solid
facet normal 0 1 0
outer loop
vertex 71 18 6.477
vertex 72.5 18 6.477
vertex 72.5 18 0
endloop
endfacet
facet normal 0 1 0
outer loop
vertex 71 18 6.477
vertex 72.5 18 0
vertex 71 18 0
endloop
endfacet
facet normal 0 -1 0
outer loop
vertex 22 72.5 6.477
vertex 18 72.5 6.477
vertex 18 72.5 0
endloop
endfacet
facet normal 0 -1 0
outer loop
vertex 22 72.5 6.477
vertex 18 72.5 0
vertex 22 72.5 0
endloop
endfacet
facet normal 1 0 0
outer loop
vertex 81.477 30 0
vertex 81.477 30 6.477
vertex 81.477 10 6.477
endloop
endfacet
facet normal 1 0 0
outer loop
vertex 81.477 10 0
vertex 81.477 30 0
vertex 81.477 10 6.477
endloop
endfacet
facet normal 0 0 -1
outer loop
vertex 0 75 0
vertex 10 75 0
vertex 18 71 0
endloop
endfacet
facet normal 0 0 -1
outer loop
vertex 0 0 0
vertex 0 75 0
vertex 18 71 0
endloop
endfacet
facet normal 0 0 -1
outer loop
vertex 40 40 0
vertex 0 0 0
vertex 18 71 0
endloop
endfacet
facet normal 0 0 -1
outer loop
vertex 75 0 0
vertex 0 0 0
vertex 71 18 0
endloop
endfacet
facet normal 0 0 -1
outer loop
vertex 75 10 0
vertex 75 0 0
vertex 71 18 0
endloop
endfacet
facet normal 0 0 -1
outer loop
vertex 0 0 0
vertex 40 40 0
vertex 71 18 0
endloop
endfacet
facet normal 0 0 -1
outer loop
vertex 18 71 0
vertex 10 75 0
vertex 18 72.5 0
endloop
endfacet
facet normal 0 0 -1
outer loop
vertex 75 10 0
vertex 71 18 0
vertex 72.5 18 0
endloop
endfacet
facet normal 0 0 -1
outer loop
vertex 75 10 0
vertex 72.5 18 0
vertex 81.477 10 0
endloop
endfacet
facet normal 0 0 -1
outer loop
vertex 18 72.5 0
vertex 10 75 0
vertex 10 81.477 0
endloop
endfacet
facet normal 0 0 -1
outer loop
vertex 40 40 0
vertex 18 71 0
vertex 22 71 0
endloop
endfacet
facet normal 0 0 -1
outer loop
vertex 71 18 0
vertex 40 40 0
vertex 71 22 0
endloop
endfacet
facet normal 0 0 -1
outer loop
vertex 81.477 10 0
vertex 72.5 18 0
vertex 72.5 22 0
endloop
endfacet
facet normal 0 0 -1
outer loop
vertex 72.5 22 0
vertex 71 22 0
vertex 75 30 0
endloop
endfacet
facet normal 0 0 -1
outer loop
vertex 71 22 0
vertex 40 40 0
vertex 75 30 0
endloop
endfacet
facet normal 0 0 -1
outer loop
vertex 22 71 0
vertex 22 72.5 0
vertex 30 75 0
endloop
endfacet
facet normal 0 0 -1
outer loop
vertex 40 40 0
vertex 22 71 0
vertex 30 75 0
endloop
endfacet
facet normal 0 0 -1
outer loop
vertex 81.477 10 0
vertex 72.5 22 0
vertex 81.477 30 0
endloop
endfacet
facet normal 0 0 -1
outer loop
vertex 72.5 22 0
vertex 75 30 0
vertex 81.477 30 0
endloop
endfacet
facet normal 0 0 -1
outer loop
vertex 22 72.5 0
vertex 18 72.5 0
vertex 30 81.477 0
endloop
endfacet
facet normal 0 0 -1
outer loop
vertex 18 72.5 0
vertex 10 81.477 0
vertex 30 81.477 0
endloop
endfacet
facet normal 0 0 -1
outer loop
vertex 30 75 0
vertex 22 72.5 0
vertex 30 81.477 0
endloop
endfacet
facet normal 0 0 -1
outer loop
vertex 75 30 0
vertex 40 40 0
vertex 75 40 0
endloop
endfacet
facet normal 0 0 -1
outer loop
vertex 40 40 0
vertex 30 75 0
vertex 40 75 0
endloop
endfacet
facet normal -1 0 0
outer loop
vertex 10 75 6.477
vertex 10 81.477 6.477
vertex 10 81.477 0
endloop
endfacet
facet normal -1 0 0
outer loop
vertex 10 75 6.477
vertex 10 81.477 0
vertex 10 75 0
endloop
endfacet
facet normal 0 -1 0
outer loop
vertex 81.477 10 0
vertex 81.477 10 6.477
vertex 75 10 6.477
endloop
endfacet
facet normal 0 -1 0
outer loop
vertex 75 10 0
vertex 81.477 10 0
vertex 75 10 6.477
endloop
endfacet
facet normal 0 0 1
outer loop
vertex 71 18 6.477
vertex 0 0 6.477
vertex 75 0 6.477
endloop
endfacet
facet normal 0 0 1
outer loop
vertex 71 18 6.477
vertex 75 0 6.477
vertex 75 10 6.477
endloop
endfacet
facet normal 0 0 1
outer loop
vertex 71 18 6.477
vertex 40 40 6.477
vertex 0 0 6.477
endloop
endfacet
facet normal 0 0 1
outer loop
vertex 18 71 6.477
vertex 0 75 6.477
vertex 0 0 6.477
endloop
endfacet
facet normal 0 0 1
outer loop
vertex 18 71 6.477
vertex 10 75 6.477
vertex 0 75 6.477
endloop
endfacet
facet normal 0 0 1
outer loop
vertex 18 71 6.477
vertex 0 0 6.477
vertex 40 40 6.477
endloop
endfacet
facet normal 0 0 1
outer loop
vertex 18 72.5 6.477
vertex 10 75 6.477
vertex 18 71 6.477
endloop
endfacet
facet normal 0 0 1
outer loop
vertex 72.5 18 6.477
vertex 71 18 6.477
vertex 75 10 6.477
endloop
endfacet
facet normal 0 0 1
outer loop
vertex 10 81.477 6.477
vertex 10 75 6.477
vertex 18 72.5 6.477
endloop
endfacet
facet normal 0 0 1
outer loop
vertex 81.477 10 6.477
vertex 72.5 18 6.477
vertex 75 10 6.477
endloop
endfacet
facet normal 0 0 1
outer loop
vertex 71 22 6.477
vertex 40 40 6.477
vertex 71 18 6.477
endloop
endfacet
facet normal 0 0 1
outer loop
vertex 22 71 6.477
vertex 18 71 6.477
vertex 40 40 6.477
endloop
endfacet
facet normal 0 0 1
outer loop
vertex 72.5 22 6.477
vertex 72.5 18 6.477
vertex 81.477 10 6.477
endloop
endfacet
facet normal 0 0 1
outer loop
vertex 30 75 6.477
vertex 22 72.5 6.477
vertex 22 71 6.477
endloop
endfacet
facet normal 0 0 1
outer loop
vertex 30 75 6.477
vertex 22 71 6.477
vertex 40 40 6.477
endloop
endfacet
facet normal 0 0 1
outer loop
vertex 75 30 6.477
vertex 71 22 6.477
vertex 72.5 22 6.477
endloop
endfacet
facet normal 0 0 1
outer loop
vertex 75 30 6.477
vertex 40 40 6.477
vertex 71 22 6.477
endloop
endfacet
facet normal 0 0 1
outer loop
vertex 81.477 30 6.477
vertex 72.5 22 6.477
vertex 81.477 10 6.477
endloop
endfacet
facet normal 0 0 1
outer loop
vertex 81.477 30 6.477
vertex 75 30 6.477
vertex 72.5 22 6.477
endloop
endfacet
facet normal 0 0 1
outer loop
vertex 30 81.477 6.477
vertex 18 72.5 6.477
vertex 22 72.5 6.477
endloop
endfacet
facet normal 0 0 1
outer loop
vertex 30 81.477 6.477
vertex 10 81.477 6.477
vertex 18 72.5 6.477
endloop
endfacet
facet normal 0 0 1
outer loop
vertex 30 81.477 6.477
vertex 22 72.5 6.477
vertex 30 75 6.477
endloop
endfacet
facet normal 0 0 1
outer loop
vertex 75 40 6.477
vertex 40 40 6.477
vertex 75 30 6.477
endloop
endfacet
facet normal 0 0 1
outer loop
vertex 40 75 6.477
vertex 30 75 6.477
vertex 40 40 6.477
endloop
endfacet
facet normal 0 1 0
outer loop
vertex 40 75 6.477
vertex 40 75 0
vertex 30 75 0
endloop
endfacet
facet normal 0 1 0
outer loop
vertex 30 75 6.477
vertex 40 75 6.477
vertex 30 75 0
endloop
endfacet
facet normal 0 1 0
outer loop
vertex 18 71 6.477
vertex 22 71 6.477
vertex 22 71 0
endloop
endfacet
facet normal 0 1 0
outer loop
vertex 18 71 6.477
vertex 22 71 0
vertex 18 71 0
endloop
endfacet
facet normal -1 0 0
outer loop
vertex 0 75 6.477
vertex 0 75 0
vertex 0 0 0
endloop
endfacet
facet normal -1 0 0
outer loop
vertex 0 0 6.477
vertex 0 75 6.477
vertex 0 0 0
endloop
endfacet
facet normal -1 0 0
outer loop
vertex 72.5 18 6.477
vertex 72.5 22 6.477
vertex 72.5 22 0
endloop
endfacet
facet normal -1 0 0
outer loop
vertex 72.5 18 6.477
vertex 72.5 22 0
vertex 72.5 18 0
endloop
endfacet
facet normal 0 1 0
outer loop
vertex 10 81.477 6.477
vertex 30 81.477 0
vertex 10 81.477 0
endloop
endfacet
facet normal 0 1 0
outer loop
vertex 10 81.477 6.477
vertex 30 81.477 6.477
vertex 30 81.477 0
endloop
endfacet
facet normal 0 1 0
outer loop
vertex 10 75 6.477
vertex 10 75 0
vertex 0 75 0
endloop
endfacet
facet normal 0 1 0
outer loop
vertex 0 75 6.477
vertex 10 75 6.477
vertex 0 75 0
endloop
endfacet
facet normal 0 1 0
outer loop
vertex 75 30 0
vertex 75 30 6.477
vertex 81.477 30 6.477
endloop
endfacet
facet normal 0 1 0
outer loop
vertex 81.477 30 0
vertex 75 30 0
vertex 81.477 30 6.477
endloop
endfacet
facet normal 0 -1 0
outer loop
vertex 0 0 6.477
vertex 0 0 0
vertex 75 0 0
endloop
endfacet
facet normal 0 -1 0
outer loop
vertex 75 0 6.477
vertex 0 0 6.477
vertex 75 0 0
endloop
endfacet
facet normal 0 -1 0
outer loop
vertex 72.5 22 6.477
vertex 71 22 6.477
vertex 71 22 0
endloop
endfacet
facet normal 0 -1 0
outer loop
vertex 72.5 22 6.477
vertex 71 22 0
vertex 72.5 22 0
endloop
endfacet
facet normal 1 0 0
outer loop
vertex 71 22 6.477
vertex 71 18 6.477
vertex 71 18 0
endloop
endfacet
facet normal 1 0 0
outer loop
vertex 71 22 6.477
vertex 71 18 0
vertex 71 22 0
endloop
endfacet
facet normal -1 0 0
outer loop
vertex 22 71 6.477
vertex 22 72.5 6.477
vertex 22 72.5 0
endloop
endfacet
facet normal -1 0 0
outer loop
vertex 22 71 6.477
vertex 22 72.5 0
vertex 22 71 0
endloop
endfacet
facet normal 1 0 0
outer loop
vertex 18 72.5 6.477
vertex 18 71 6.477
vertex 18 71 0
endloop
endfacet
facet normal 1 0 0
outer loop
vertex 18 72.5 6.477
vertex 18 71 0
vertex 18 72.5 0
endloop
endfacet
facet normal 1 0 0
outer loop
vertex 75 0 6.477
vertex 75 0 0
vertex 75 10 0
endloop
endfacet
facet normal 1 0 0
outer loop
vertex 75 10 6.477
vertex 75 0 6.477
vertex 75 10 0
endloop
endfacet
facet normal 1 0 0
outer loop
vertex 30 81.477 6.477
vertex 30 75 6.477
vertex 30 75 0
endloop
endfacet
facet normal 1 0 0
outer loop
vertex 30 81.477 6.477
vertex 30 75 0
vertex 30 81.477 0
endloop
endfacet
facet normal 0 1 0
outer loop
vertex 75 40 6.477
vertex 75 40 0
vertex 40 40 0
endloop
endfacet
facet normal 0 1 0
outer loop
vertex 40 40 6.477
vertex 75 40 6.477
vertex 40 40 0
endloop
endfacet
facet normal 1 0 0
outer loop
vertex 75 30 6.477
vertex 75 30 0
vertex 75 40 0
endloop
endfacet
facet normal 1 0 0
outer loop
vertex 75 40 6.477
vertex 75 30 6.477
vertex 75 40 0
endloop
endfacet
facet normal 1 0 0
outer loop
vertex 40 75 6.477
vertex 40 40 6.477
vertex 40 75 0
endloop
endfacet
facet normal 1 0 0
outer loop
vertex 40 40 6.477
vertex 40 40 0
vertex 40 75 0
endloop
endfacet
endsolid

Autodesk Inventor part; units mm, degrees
ref_plane "YZ Plane" through (0, 0, 0) normal (1, 0, 0) x (0, 1, 0)
ref_plane "XZ Plane" through (0, 0, 0) normal (0, 1, 0) x (-1, 0, 0)
ref_plane "XY Plane" through (0, 0, 0) normal (0, 0, 1) x (1, 0, 0)
sketch "Sketch1" plane through (0, 0, 0) normal (0, 0, 1) x (1, 0, 0)
  line L0 (0, 75) -> (0, 0)
  line L1 (0, 0) -> (75, 0)
  line L2 (75, 0) -> (75, 40)
  line L3 (75, 40) -> (40, 40)
  line L4 (40, 40) -> (40, 75)
  line L5 (40, 75) -> (0, 75)
  dimension "d0" = 75
  dimension "d2" = 40
extrude "Extrusion1" add sketch "Sketch1" along normal blind 6.477
sketch "Sketch2" plane through (0, 0, 6.477) normal (0, 0, 1) x (1, 0, 0)
  line L0 (75, 0) -> (75, 40) projected
  line L1 (40, 75) -> (0, 75) projected
  line L2 (10, 75) -> (30, 75)
  line L3 (30, 75) -> (30, 81.477)
  line L4 (30, 81.477) -> (10, 81.477)
  line L5 (10, 81.477) -> (10, 75)
  line L6 (75, 30) -> (81.477, 30)
  line L7 (81.477, 30) -> (81.477, 10)
  line L8 (81.477, 10) -> (75, 10)
  line L9 (75, 10) -> (75, 30)
  point P0 (75, 20)
  point P1 (20, 75)
  dimension "d5" = 6.477
  dimension "d7" = 20
extrude "Extrusion2" add sketch "Sketch2" against normal up to surface (6.477 mm away)
sketch "Sketch3" plane through (0, 0, 6.477) normal (0, 0, 1) x (1, 0, 0)
  line L0 (81.477, 10) -> (81.477, 30) projected
  line L1 (75, 30) -> (75, 40) projected
  line L2 (40, 75) -> (30, 75) projected
  line L3 (30, 81.477) -> (10, 81.477) projected
  line L4 (18, 72.5) -> (22, 72.5)
  line L5 (22, 72.5) -> (22, 71)
  line L6 (22, 71) -> (18, 71)
  line L7 (18, 71) -> (18, 72.5)
  line L8 (72.5, 18) -> (71, 18)
  line L9 (71, 18) -> (71, 22)
  line L10 (71, 22) -> (72.5, 22)
  line L11 (72.5, 22) -> (72.5, 18)
  point P0 (72.5, 20)
  point P1 (81.477, 20)
  point P2 (20, 72.5)
  point P3 (20, 81.477)
  dimension "d10" = 2.5
  dimension "d11" = 2.5
  dimension "d12" = 1.5
  dimension "d13" = 4
extrude "Extrusion3" cut sketch "Sketch3" against normal through all
properties part number "OVERHANG SUPPORT"
